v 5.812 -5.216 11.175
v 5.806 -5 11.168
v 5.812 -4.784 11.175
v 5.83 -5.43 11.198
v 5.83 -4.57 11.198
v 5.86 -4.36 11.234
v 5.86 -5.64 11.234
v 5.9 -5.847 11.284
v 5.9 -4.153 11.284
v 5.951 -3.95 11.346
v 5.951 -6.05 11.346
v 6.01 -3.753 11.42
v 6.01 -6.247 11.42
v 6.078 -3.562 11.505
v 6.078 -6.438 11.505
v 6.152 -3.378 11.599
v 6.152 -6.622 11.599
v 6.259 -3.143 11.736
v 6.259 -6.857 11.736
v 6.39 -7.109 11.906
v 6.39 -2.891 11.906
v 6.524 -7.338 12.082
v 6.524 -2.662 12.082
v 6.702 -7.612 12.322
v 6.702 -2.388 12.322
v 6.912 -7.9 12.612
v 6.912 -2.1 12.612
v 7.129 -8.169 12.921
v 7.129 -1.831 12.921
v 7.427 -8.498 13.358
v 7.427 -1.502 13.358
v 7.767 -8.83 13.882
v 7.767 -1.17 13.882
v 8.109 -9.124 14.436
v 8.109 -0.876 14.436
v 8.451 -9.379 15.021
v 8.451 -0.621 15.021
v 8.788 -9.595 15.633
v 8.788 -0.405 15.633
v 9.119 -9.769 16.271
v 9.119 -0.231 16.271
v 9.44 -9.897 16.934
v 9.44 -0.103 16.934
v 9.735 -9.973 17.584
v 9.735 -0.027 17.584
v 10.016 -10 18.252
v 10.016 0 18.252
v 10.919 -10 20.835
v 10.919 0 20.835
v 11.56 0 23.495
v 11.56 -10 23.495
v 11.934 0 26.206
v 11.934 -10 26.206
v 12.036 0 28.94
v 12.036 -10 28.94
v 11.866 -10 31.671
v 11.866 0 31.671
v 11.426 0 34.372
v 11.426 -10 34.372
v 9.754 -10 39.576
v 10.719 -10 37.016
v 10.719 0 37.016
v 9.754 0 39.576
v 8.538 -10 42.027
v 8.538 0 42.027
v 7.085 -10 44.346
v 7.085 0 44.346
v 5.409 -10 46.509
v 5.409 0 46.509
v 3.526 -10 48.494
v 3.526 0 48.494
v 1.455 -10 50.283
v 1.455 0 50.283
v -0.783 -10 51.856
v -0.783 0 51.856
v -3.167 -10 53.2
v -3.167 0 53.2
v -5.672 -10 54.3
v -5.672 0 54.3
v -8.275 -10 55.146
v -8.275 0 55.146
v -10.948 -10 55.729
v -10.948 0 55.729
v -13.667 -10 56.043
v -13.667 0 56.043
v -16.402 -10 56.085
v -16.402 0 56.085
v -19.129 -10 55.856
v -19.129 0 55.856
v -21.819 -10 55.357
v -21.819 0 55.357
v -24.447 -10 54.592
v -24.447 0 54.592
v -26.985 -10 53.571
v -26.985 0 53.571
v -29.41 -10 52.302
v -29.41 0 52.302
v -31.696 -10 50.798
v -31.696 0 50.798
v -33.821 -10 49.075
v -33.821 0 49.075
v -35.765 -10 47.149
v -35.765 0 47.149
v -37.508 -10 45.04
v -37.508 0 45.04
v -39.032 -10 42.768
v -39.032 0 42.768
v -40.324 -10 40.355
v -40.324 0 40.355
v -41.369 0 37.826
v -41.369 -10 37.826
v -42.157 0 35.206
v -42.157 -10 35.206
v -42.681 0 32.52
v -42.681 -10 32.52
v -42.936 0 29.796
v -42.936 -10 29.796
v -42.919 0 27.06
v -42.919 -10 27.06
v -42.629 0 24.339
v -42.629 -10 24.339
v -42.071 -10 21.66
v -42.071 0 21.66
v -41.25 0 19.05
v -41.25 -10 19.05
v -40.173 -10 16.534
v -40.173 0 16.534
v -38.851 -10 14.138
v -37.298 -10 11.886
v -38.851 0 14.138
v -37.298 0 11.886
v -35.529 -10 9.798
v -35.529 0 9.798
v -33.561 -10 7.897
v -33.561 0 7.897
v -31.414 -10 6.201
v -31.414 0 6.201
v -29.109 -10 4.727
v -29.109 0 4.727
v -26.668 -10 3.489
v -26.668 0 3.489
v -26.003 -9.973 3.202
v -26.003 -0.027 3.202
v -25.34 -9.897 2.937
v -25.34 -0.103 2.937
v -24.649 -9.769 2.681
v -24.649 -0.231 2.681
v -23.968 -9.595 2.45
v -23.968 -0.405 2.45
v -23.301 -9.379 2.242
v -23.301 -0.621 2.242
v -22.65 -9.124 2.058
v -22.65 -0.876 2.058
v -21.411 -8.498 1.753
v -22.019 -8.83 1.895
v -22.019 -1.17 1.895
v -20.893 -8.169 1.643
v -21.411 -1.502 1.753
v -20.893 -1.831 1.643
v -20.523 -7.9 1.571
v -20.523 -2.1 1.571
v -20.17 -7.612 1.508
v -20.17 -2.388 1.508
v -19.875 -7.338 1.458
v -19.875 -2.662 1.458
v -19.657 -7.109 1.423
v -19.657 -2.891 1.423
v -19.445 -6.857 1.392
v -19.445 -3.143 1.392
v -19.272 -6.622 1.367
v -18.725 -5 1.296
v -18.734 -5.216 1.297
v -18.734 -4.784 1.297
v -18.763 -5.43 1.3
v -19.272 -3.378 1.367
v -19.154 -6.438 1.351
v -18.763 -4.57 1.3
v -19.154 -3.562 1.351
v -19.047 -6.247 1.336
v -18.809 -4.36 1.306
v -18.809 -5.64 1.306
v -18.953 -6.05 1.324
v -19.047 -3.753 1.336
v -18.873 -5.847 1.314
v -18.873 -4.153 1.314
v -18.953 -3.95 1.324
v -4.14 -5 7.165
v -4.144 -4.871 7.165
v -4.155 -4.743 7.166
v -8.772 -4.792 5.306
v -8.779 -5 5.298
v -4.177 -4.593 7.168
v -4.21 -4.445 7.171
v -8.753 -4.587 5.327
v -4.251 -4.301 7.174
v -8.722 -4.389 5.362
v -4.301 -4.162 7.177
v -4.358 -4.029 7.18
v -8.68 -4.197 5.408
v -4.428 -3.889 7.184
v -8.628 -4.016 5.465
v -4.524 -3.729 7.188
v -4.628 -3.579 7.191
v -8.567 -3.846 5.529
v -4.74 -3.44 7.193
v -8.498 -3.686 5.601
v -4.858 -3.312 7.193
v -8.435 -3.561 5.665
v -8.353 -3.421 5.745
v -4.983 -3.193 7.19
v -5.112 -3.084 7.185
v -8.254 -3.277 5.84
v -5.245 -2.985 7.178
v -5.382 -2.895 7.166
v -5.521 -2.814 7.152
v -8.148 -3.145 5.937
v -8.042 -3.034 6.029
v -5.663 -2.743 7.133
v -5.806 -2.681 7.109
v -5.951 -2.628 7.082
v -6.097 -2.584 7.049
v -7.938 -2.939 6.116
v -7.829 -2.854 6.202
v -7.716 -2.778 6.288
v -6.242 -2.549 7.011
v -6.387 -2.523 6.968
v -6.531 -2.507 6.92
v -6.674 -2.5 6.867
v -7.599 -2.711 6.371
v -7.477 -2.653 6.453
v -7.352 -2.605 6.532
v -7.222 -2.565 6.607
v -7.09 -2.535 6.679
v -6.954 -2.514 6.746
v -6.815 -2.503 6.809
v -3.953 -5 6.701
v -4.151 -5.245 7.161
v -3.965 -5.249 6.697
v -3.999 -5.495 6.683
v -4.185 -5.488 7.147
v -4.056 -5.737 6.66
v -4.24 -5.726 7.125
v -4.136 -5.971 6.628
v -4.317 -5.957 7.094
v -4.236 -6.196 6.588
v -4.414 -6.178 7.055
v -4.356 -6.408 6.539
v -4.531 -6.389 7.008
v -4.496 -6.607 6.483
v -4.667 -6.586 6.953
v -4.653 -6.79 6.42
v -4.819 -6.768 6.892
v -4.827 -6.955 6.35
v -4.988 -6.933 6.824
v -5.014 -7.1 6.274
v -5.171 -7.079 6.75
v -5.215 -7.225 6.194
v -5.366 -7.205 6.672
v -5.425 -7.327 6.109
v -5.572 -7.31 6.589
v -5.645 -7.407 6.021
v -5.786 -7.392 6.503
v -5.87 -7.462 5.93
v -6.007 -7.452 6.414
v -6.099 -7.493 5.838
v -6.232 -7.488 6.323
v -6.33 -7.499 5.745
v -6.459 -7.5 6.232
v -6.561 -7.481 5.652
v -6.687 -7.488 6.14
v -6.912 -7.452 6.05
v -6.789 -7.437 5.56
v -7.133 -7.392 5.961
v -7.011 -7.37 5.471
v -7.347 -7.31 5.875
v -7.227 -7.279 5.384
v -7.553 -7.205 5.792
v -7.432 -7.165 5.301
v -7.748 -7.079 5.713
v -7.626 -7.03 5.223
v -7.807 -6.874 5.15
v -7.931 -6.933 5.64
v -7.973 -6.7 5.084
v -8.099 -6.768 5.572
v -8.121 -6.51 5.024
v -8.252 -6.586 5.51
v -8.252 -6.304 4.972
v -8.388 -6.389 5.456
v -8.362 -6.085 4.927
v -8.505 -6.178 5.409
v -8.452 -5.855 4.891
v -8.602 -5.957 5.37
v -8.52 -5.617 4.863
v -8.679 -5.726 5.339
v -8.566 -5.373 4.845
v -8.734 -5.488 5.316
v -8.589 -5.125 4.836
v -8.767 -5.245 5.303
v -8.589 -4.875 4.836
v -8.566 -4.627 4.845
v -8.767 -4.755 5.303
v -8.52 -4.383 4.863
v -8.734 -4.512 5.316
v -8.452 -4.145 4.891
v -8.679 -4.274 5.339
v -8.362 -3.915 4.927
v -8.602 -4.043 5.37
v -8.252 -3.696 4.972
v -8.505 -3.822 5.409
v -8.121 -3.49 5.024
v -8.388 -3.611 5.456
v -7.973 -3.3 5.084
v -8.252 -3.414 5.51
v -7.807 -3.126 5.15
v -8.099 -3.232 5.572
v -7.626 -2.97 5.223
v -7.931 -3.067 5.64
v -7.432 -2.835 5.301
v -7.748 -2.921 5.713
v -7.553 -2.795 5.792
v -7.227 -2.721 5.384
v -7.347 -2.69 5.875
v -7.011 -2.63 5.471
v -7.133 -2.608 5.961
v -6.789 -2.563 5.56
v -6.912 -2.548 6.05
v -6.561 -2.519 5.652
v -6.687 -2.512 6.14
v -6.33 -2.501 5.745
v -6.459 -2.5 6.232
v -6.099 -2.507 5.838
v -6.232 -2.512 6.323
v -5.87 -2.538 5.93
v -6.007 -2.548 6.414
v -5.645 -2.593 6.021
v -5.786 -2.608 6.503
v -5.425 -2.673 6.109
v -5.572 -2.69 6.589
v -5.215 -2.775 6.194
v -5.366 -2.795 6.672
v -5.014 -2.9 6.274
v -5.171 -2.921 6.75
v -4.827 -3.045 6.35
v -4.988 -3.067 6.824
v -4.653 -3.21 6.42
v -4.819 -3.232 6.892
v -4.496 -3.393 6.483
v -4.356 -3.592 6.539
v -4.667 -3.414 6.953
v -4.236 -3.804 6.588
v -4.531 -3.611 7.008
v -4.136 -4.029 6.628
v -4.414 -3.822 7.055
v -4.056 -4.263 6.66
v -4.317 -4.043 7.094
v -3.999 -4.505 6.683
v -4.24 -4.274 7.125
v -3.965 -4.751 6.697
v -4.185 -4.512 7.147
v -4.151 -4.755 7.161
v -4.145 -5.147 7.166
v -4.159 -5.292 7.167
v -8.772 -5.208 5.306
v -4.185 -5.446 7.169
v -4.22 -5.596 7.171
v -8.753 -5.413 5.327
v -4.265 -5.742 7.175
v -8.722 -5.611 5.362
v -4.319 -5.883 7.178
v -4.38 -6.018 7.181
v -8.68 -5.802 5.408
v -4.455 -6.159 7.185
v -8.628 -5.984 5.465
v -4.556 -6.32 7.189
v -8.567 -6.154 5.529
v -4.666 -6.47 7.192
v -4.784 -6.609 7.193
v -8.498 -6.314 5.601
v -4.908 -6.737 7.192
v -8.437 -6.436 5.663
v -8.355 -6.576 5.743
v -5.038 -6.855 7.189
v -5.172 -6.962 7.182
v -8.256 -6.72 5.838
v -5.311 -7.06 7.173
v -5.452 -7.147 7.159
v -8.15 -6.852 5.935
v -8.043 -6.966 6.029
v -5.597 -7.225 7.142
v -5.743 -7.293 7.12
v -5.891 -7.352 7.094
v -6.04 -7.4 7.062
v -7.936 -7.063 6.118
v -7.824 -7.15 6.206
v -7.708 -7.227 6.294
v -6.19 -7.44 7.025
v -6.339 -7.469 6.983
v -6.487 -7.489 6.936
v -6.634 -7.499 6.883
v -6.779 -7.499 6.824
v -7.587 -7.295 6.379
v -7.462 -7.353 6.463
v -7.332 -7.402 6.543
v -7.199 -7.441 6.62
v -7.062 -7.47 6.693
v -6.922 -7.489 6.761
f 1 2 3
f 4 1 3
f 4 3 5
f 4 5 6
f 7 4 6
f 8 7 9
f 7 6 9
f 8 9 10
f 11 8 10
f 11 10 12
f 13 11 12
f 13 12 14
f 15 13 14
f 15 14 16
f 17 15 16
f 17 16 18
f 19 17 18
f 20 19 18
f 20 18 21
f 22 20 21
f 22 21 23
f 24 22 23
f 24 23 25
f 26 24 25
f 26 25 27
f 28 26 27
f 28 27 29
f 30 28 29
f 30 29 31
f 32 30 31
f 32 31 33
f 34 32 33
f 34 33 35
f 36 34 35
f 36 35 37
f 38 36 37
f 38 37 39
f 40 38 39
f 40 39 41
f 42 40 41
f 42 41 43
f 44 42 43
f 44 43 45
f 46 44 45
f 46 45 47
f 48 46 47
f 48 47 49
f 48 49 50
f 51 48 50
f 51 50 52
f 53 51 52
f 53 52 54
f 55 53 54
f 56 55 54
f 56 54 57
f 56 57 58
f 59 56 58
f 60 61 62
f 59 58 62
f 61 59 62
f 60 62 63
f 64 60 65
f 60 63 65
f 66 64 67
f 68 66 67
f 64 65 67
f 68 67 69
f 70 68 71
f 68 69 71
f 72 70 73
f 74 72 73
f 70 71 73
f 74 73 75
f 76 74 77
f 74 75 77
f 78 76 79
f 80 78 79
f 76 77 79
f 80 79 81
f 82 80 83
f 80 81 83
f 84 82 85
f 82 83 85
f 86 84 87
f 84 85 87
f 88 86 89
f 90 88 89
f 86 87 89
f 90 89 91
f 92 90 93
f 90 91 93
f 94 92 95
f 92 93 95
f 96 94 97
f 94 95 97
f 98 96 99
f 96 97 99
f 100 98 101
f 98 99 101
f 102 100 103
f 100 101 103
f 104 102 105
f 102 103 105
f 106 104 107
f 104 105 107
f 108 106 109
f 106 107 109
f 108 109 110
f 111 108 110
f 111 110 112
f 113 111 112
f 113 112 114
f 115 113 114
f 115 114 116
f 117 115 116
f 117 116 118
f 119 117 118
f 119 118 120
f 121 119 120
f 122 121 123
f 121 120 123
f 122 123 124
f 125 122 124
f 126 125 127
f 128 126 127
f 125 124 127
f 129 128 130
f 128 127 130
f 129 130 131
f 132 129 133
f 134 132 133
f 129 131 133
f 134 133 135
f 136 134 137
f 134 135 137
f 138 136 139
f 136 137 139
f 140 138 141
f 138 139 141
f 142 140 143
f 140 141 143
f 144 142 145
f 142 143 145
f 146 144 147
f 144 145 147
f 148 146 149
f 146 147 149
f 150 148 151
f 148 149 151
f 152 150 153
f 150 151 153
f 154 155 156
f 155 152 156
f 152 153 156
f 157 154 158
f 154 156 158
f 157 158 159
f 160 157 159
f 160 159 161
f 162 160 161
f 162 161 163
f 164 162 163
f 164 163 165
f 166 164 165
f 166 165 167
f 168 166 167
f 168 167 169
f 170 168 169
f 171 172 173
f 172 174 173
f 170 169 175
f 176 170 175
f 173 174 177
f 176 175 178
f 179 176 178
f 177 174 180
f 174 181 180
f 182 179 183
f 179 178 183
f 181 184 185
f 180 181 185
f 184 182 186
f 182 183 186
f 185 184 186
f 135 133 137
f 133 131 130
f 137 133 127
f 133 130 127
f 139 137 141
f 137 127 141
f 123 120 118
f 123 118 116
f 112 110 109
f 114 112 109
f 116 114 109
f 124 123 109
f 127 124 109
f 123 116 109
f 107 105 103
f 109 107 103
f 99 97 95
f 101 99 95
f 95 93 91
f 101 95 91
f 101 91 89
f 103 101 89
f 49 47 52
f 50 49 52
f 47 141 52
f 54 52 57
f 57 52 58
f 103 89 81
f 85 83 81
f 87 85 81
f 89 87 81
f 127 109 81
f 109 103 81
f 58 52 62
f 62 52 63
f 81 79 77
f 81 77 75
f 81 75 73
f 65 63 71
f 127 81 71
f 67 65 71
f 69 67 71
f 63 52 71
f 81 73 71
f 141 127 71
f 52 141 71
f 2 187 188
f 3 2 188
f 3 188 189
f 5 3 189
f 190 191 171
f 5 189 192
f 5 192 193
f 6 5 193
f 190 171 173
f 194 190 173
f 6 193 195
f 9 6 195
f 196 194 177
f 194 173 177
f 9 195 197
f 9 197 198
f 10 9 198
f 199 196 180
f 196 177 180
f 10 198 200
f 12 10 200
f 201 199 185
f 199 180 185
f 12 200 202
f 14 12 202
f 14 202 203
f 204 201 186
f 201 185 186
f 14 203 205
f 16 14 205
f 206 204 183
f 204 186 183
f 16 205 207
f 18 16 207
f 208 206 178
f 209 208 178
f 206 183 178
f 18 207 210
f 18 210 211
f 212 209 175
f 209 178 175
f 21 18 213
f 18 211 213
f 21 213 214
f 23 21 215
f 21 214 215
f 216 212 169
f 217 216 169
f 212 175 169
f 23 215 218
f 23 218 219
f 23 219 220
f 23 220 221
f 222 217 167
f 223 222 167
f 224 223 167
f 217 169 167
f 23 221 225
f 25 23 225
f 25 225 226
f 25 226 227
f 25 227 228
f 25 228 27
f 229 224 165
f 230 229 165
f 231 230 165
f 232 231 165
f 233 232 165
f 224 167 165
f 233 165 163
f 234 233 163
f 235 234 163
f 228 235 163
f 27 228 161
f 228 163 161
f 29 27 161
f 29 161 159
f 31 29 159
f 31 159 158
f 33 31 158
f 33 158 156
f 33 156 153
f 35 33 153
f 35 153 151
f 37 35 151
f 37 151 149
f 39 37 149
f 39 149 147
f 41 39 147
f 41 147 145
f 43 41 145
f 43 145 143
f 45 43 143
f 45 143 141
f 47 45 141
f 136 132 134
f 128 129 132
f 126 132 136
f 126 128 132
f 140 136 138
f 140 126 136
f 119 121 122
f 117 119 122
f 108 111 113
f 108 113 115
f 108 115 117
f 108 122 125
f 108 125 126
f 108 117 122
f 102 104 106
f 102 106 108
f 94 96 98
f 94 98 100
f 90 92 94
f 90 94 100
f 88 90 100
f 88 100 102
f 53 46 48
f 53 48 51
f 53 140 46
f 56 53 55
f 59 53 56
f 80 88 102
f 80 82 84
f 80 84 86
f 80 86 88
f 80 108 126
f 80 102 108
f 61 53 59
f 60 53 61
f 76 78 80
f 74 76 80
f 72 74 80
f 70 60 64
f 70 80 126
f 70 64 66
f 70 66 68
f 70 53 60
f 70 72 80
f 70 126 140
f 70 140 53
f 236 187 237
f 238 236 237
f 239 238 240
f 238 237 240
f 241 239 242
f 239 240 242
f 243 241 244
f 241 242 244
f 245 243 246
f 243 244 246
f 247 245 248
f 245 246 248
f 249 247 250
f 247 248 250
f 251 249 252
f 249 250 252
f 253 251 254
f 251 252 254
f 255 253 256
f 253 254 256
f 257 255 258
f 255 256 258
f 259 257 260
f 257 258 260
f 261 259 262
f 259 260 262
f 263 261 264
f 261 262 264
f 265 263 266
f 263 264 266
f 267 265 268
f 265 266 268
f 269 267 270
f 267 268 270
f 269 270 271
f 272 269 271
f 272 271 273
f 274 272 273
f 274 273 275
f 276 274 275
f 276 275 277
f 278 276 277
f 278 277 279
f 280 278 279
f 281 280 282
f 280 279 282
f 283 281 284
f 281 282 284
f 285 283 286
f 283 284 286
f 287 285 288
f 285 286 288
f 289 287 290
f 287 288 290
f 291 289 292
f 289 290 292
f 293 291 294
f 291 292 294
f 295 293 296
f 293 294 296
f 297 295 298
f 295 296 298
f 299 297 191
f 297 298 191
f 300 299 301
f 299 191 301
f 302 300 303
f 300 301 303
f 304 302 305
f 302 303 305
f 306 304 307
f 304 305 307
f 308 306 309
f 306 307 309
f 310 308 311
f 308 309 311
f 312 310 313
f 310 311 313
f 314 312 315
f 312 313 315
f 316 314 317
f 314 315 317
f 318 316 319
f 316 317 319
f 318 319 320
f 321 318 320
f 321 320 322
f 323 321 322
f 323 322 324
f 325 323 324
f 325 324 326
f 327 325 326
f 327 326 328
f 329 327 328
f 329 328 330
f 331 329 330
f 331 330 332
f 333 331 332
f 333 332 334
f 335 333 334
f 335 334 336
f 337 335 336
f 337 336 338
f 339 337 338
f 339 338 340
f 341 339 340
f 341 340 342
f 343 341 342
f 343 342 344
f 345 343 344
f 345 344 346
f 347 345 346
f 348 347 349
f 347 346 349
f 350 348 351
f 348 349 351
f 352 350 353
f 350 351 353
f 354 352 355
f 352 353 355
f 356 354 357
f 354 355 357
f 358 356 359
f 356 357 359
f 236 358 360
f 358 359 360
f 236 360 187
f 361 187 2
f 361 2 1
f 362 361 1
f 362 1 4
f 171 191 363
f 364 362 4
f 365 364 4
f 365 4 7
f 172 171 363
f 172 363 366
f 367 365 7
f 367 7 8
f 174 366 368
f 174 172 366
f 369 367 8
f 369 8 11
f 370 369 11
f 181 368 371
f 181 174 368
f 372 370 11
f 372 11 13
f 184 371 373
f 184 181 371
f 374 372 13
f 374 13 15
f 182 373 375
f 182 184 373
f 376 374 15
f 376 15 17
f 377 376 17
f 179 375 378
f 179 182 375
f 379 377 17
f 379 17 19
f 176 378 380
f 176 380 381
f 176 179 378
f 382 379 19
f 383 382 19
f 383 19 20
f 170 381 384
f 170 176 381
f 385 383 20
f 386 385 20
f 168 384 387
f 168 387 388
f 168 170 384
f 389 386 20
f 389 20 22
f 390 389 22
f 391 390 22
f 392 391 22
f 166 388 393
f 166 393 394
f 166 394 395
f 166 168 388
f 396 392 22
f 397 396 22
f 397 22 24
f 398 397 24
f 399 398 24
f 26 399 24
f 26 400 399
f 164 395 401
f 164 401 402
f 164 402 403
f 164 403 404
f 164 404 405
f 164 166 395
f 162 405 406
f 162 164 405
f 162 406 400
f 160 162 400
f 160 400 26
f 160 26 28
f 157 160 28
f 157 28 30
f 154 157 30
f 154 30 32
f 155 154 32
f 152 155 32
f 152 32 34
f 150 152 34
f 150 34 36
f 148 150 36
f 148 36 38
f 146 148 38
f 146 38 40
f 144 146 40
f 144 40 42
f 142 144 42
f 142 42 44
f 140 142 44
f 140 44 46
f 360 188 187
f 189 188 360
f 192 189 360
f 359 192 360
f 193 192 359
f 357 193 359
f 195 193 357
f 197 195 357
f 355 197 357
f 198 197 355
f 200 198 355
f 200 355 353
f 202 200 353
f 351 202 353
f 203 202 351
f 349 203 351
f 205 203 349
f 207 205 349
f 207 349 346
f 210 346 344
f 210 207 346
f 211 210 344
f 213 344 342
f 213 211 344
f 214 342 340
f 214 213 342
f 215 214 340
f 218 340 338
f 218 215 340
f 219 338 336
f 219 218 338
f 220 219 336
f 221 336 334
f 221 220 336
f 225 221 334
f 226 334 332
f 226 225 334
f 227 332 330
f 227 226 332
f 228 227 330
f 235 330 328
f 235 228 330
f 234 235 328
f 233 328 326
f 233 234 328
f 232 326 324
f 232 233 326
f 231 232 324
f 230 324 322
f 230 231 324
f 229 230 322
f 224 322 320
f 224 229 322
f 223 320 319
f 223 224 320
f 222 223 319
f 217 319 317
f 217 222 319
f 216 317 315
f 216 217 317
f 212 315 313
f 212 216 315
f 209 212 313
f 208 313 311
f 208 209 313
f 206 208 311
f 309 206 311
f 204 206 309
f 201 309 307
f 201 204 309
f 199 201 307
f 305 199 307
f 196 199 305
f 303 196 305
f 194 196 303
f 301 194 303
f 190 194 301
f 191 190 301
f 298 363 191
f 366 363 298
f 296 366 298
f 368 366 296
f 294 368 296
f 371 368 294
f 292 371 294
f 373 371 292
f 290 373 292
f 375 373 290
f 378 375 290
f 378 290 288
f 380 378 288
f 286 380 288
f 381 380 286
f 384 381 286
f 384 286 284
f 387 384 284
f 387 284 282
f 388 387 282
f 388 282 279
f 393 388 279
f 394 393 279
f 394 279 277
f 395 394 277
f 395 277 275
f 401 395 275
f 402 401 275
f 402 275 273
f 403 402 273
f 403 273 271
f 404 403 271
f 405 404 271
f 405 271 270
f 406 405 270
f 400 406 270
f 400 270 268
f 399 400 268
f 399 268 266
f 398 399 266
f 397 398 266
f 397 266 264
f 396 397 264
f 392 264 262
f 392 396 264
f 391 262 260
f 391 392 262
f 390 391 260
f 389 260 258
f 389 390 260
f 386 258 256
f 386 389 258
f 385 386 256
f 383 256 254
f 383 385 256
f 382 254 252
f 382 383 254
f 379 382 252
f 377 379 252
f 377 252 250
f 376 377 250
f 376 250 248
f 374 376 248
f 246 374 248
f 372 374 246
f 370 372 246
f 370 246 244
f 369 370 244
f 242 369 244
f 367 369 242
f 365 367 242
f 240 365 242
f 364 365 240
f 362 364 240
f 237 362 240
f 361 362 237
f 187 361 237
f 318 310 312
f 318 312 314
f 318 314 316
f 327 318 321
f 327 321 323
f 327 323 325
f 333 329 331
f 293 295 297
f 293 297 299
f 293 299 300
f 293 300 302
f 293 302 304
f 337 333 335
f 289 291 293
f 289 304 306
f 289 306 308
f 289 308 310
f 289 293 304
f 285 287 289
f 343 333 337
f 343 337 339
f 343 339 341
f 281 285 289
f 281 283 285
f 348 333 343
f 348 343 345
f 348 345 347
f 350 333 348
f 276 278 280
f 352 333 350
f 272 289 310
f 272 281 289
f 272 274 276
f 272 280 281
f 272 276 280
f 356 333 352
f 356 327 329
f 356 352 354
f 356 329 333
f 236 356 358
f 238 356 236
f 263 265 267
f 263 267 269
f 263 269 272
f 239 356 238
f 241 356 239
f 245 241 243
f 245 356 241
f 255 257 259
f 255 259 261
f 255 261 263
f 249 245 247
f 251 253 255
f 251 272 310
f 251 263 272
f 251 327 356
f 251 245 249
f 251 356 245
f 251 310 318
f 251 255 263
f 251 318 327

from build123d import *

# Parameters (mm, degrees)
F1_DEPTH     = 10
F2_R         = 2.5
F3_DEPTH     = 0.5
F4_T4_DEPTH  = 51.44253063
F4_S5_R      = 2.5
F4_T6_DEPTH  = 29
F4_T10_DEPTH = 51.44253063
F4_S11_R     = 2.5
F4_T12_DEPTH = 29


# Not quite as in the source:
# - a fillet or chamfer that OpenCascade refuses, or shapes differently, is made with other operations: its cross-section is extruded or revolved along the edge and cut away or added


with BuildPart() as f1:
    # F0 (on Front) → F1 (new body)
    with BuildSketch(Plane.XZ):
        with BuildLine():
            Line((-18.7246046442, 1.2957563709), (5.805945114, 11.1679169591))
            ThreePointArc((5.805945114, 11.1679169591), (-25.7288225372, 54.1130726963), (-18.7246046442, 1.2957563709))
        make_face()
    extrude(amount=F1_DEPTH)

    # F2 (on face) → F3 (join)
    with BuildSketch(Plane(origin=(-3.0587265768, 0, 7.6003873539), x_dir=(0.9276929694, 0, 0.3733440164), z_dir=(0.3733440164, 0, -0.9276929694))):
        with Locations((-3.6656558802, 4.9999994226)):
            Circle(F2_R)
    extrude(amount=F3_DEPTH)

    # F4: fillet of radius 5 on 2 edges, made by hand


with BuildPart() as f4_tool2:
    # F4_s3 → F4_t4 (new body)
    with BuildSketch(Plane(origin=(-27.2620401847, 0, -10.9714311875), x_dir=(0, 1, 0), z_dir=(0.9276929694, 0, 0.3733440164))):
        with BuildLine():
            ThreePointArc((-5, 8.192783178), (-8.5355339059, 9.657249272), (-10, 13.192783178))
            Line((-10, 13.192783178), (-10, 8.192783178))
            Line((-10, 8.192783178), (-5, 8.192783178))
        make_face()
    extrude(amount=F4_T4_DEPTH)

    # F4_s5 → F4_t6 (cut, symmetric)
    with BuildSketch(Plane(origin=(-3.9947809751, 0, 9.9263147724), x_dir=(0, 1, 0), z_dir=(-0.3733440164, 0, 0.9276929694))):
        with Locations((-4.9999994226, 3.6656558802)):
            Circle(F4_S5_R)
    extrude(amount=F4_T6_DEPTH, both=True, mode=Mode.SUBTRACT)


with BuildPart() as f1_1:
    add(f1.part)

    # F4_t1: cut F4_tool2
    add(f4_tool2.part, mode=Mode.SUBTRACT)


with BuildPart() as f4_tool8:
    # F4_s9 → F4_t10 (new body)
    with BuildSketch(Plane(origin=(-27.2620401847, 0, -10.9714311875), x_dir=(0, 1, 0), z_dir=(0.9276929694, 0, 0.3733440164))):
        with BuildLine():
            ThreePointArc((-5, 8.192783178), (-1.4644660941, 9.657249272), (0, 13.192783178))
            Line((0, 13.192783178), (0, 8.192783178))
            Line((0, 8.192783178), (-5, 8.192783178))
        make_face()
    extrude(amount=F4_T10_DEPTH)

    # F4_s11 → F4_t12 (cut, symmetric)
    with BuildSketch(Plane(origin=(-3.9947809751, 0, 9.9263147724), x_dir=(0, 1, 0), z_dir=(-0.3733440164, 0, 0.9276929694))):
        with Locations((-4.9999994226, 3.6656558802)):
            Circle(F4_S11_R)
    extrude(amount=F4_T12_DEPTH, both=True, mode=Mode.SUBTRACT)


with BuildPart() as f1_2:
    add(f1_1.part)

    # F4_t7: cut F4_tool8
    add(f4_tool8.part, mode=Mode.SUBTRACT)


solid = f1_2.part
